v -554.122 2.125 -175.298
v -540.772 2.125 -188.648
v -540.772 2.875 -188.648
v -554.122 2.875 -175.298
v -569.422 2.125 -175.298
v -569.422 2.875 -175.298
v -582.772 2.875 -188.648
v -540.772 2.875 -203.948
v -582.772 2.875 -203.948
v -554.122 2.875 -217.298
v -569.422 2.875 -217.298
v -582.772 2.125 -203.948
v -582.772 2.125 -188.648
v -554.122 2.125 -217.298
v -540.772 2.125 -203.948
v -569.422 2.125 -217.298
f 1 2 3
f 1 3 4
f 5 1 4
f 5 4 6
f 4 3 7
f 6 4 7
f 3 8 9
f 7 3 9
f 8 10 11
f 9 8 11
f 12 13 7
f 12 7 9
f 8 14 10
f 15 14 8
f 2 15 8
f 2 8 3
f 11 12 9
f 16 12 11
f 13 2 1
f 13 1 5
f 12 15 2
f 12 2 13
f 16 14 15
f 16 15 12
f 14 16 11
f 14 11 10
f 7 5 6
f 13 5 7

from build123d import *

# Parameters (mm, degrees)
BOSS_EXTRUDE1_DEPTH = 5
SCALE1_SCALE        = 0.15


with BuildPart() as part:
    # Sketch3 → Boss-Extrude1 (new body)
    with BuildSketch(Plane(origin=(0, 0, 0), x_dir=(1, 0, 0), z_dir=(0, 1, 0))):
        Polygon((-612.771529665, 336.297556136), (-510.771529665, 336.297556136), (-421.771529665, 247.297556136), (-421.771529665, 145.297556136), (-510.771529665, 56.297556136), (-612.771529665, 56.297556136), (-701.771529665, 145.297556136), (-701.771529665, 247.297556136), align=None)
    extrude(amount=BOSS_EXTRUDE1_DEPTH)


with BuildPart() as part_1:
    # Scale1: scaled about (-561.771529665, 2.5, -196.297556136)
    add(part.part.scale(SCALE1_SCALE).moved(Location((-477.505800215, 2.125, -166.852922716))))


solid = part_1.part
